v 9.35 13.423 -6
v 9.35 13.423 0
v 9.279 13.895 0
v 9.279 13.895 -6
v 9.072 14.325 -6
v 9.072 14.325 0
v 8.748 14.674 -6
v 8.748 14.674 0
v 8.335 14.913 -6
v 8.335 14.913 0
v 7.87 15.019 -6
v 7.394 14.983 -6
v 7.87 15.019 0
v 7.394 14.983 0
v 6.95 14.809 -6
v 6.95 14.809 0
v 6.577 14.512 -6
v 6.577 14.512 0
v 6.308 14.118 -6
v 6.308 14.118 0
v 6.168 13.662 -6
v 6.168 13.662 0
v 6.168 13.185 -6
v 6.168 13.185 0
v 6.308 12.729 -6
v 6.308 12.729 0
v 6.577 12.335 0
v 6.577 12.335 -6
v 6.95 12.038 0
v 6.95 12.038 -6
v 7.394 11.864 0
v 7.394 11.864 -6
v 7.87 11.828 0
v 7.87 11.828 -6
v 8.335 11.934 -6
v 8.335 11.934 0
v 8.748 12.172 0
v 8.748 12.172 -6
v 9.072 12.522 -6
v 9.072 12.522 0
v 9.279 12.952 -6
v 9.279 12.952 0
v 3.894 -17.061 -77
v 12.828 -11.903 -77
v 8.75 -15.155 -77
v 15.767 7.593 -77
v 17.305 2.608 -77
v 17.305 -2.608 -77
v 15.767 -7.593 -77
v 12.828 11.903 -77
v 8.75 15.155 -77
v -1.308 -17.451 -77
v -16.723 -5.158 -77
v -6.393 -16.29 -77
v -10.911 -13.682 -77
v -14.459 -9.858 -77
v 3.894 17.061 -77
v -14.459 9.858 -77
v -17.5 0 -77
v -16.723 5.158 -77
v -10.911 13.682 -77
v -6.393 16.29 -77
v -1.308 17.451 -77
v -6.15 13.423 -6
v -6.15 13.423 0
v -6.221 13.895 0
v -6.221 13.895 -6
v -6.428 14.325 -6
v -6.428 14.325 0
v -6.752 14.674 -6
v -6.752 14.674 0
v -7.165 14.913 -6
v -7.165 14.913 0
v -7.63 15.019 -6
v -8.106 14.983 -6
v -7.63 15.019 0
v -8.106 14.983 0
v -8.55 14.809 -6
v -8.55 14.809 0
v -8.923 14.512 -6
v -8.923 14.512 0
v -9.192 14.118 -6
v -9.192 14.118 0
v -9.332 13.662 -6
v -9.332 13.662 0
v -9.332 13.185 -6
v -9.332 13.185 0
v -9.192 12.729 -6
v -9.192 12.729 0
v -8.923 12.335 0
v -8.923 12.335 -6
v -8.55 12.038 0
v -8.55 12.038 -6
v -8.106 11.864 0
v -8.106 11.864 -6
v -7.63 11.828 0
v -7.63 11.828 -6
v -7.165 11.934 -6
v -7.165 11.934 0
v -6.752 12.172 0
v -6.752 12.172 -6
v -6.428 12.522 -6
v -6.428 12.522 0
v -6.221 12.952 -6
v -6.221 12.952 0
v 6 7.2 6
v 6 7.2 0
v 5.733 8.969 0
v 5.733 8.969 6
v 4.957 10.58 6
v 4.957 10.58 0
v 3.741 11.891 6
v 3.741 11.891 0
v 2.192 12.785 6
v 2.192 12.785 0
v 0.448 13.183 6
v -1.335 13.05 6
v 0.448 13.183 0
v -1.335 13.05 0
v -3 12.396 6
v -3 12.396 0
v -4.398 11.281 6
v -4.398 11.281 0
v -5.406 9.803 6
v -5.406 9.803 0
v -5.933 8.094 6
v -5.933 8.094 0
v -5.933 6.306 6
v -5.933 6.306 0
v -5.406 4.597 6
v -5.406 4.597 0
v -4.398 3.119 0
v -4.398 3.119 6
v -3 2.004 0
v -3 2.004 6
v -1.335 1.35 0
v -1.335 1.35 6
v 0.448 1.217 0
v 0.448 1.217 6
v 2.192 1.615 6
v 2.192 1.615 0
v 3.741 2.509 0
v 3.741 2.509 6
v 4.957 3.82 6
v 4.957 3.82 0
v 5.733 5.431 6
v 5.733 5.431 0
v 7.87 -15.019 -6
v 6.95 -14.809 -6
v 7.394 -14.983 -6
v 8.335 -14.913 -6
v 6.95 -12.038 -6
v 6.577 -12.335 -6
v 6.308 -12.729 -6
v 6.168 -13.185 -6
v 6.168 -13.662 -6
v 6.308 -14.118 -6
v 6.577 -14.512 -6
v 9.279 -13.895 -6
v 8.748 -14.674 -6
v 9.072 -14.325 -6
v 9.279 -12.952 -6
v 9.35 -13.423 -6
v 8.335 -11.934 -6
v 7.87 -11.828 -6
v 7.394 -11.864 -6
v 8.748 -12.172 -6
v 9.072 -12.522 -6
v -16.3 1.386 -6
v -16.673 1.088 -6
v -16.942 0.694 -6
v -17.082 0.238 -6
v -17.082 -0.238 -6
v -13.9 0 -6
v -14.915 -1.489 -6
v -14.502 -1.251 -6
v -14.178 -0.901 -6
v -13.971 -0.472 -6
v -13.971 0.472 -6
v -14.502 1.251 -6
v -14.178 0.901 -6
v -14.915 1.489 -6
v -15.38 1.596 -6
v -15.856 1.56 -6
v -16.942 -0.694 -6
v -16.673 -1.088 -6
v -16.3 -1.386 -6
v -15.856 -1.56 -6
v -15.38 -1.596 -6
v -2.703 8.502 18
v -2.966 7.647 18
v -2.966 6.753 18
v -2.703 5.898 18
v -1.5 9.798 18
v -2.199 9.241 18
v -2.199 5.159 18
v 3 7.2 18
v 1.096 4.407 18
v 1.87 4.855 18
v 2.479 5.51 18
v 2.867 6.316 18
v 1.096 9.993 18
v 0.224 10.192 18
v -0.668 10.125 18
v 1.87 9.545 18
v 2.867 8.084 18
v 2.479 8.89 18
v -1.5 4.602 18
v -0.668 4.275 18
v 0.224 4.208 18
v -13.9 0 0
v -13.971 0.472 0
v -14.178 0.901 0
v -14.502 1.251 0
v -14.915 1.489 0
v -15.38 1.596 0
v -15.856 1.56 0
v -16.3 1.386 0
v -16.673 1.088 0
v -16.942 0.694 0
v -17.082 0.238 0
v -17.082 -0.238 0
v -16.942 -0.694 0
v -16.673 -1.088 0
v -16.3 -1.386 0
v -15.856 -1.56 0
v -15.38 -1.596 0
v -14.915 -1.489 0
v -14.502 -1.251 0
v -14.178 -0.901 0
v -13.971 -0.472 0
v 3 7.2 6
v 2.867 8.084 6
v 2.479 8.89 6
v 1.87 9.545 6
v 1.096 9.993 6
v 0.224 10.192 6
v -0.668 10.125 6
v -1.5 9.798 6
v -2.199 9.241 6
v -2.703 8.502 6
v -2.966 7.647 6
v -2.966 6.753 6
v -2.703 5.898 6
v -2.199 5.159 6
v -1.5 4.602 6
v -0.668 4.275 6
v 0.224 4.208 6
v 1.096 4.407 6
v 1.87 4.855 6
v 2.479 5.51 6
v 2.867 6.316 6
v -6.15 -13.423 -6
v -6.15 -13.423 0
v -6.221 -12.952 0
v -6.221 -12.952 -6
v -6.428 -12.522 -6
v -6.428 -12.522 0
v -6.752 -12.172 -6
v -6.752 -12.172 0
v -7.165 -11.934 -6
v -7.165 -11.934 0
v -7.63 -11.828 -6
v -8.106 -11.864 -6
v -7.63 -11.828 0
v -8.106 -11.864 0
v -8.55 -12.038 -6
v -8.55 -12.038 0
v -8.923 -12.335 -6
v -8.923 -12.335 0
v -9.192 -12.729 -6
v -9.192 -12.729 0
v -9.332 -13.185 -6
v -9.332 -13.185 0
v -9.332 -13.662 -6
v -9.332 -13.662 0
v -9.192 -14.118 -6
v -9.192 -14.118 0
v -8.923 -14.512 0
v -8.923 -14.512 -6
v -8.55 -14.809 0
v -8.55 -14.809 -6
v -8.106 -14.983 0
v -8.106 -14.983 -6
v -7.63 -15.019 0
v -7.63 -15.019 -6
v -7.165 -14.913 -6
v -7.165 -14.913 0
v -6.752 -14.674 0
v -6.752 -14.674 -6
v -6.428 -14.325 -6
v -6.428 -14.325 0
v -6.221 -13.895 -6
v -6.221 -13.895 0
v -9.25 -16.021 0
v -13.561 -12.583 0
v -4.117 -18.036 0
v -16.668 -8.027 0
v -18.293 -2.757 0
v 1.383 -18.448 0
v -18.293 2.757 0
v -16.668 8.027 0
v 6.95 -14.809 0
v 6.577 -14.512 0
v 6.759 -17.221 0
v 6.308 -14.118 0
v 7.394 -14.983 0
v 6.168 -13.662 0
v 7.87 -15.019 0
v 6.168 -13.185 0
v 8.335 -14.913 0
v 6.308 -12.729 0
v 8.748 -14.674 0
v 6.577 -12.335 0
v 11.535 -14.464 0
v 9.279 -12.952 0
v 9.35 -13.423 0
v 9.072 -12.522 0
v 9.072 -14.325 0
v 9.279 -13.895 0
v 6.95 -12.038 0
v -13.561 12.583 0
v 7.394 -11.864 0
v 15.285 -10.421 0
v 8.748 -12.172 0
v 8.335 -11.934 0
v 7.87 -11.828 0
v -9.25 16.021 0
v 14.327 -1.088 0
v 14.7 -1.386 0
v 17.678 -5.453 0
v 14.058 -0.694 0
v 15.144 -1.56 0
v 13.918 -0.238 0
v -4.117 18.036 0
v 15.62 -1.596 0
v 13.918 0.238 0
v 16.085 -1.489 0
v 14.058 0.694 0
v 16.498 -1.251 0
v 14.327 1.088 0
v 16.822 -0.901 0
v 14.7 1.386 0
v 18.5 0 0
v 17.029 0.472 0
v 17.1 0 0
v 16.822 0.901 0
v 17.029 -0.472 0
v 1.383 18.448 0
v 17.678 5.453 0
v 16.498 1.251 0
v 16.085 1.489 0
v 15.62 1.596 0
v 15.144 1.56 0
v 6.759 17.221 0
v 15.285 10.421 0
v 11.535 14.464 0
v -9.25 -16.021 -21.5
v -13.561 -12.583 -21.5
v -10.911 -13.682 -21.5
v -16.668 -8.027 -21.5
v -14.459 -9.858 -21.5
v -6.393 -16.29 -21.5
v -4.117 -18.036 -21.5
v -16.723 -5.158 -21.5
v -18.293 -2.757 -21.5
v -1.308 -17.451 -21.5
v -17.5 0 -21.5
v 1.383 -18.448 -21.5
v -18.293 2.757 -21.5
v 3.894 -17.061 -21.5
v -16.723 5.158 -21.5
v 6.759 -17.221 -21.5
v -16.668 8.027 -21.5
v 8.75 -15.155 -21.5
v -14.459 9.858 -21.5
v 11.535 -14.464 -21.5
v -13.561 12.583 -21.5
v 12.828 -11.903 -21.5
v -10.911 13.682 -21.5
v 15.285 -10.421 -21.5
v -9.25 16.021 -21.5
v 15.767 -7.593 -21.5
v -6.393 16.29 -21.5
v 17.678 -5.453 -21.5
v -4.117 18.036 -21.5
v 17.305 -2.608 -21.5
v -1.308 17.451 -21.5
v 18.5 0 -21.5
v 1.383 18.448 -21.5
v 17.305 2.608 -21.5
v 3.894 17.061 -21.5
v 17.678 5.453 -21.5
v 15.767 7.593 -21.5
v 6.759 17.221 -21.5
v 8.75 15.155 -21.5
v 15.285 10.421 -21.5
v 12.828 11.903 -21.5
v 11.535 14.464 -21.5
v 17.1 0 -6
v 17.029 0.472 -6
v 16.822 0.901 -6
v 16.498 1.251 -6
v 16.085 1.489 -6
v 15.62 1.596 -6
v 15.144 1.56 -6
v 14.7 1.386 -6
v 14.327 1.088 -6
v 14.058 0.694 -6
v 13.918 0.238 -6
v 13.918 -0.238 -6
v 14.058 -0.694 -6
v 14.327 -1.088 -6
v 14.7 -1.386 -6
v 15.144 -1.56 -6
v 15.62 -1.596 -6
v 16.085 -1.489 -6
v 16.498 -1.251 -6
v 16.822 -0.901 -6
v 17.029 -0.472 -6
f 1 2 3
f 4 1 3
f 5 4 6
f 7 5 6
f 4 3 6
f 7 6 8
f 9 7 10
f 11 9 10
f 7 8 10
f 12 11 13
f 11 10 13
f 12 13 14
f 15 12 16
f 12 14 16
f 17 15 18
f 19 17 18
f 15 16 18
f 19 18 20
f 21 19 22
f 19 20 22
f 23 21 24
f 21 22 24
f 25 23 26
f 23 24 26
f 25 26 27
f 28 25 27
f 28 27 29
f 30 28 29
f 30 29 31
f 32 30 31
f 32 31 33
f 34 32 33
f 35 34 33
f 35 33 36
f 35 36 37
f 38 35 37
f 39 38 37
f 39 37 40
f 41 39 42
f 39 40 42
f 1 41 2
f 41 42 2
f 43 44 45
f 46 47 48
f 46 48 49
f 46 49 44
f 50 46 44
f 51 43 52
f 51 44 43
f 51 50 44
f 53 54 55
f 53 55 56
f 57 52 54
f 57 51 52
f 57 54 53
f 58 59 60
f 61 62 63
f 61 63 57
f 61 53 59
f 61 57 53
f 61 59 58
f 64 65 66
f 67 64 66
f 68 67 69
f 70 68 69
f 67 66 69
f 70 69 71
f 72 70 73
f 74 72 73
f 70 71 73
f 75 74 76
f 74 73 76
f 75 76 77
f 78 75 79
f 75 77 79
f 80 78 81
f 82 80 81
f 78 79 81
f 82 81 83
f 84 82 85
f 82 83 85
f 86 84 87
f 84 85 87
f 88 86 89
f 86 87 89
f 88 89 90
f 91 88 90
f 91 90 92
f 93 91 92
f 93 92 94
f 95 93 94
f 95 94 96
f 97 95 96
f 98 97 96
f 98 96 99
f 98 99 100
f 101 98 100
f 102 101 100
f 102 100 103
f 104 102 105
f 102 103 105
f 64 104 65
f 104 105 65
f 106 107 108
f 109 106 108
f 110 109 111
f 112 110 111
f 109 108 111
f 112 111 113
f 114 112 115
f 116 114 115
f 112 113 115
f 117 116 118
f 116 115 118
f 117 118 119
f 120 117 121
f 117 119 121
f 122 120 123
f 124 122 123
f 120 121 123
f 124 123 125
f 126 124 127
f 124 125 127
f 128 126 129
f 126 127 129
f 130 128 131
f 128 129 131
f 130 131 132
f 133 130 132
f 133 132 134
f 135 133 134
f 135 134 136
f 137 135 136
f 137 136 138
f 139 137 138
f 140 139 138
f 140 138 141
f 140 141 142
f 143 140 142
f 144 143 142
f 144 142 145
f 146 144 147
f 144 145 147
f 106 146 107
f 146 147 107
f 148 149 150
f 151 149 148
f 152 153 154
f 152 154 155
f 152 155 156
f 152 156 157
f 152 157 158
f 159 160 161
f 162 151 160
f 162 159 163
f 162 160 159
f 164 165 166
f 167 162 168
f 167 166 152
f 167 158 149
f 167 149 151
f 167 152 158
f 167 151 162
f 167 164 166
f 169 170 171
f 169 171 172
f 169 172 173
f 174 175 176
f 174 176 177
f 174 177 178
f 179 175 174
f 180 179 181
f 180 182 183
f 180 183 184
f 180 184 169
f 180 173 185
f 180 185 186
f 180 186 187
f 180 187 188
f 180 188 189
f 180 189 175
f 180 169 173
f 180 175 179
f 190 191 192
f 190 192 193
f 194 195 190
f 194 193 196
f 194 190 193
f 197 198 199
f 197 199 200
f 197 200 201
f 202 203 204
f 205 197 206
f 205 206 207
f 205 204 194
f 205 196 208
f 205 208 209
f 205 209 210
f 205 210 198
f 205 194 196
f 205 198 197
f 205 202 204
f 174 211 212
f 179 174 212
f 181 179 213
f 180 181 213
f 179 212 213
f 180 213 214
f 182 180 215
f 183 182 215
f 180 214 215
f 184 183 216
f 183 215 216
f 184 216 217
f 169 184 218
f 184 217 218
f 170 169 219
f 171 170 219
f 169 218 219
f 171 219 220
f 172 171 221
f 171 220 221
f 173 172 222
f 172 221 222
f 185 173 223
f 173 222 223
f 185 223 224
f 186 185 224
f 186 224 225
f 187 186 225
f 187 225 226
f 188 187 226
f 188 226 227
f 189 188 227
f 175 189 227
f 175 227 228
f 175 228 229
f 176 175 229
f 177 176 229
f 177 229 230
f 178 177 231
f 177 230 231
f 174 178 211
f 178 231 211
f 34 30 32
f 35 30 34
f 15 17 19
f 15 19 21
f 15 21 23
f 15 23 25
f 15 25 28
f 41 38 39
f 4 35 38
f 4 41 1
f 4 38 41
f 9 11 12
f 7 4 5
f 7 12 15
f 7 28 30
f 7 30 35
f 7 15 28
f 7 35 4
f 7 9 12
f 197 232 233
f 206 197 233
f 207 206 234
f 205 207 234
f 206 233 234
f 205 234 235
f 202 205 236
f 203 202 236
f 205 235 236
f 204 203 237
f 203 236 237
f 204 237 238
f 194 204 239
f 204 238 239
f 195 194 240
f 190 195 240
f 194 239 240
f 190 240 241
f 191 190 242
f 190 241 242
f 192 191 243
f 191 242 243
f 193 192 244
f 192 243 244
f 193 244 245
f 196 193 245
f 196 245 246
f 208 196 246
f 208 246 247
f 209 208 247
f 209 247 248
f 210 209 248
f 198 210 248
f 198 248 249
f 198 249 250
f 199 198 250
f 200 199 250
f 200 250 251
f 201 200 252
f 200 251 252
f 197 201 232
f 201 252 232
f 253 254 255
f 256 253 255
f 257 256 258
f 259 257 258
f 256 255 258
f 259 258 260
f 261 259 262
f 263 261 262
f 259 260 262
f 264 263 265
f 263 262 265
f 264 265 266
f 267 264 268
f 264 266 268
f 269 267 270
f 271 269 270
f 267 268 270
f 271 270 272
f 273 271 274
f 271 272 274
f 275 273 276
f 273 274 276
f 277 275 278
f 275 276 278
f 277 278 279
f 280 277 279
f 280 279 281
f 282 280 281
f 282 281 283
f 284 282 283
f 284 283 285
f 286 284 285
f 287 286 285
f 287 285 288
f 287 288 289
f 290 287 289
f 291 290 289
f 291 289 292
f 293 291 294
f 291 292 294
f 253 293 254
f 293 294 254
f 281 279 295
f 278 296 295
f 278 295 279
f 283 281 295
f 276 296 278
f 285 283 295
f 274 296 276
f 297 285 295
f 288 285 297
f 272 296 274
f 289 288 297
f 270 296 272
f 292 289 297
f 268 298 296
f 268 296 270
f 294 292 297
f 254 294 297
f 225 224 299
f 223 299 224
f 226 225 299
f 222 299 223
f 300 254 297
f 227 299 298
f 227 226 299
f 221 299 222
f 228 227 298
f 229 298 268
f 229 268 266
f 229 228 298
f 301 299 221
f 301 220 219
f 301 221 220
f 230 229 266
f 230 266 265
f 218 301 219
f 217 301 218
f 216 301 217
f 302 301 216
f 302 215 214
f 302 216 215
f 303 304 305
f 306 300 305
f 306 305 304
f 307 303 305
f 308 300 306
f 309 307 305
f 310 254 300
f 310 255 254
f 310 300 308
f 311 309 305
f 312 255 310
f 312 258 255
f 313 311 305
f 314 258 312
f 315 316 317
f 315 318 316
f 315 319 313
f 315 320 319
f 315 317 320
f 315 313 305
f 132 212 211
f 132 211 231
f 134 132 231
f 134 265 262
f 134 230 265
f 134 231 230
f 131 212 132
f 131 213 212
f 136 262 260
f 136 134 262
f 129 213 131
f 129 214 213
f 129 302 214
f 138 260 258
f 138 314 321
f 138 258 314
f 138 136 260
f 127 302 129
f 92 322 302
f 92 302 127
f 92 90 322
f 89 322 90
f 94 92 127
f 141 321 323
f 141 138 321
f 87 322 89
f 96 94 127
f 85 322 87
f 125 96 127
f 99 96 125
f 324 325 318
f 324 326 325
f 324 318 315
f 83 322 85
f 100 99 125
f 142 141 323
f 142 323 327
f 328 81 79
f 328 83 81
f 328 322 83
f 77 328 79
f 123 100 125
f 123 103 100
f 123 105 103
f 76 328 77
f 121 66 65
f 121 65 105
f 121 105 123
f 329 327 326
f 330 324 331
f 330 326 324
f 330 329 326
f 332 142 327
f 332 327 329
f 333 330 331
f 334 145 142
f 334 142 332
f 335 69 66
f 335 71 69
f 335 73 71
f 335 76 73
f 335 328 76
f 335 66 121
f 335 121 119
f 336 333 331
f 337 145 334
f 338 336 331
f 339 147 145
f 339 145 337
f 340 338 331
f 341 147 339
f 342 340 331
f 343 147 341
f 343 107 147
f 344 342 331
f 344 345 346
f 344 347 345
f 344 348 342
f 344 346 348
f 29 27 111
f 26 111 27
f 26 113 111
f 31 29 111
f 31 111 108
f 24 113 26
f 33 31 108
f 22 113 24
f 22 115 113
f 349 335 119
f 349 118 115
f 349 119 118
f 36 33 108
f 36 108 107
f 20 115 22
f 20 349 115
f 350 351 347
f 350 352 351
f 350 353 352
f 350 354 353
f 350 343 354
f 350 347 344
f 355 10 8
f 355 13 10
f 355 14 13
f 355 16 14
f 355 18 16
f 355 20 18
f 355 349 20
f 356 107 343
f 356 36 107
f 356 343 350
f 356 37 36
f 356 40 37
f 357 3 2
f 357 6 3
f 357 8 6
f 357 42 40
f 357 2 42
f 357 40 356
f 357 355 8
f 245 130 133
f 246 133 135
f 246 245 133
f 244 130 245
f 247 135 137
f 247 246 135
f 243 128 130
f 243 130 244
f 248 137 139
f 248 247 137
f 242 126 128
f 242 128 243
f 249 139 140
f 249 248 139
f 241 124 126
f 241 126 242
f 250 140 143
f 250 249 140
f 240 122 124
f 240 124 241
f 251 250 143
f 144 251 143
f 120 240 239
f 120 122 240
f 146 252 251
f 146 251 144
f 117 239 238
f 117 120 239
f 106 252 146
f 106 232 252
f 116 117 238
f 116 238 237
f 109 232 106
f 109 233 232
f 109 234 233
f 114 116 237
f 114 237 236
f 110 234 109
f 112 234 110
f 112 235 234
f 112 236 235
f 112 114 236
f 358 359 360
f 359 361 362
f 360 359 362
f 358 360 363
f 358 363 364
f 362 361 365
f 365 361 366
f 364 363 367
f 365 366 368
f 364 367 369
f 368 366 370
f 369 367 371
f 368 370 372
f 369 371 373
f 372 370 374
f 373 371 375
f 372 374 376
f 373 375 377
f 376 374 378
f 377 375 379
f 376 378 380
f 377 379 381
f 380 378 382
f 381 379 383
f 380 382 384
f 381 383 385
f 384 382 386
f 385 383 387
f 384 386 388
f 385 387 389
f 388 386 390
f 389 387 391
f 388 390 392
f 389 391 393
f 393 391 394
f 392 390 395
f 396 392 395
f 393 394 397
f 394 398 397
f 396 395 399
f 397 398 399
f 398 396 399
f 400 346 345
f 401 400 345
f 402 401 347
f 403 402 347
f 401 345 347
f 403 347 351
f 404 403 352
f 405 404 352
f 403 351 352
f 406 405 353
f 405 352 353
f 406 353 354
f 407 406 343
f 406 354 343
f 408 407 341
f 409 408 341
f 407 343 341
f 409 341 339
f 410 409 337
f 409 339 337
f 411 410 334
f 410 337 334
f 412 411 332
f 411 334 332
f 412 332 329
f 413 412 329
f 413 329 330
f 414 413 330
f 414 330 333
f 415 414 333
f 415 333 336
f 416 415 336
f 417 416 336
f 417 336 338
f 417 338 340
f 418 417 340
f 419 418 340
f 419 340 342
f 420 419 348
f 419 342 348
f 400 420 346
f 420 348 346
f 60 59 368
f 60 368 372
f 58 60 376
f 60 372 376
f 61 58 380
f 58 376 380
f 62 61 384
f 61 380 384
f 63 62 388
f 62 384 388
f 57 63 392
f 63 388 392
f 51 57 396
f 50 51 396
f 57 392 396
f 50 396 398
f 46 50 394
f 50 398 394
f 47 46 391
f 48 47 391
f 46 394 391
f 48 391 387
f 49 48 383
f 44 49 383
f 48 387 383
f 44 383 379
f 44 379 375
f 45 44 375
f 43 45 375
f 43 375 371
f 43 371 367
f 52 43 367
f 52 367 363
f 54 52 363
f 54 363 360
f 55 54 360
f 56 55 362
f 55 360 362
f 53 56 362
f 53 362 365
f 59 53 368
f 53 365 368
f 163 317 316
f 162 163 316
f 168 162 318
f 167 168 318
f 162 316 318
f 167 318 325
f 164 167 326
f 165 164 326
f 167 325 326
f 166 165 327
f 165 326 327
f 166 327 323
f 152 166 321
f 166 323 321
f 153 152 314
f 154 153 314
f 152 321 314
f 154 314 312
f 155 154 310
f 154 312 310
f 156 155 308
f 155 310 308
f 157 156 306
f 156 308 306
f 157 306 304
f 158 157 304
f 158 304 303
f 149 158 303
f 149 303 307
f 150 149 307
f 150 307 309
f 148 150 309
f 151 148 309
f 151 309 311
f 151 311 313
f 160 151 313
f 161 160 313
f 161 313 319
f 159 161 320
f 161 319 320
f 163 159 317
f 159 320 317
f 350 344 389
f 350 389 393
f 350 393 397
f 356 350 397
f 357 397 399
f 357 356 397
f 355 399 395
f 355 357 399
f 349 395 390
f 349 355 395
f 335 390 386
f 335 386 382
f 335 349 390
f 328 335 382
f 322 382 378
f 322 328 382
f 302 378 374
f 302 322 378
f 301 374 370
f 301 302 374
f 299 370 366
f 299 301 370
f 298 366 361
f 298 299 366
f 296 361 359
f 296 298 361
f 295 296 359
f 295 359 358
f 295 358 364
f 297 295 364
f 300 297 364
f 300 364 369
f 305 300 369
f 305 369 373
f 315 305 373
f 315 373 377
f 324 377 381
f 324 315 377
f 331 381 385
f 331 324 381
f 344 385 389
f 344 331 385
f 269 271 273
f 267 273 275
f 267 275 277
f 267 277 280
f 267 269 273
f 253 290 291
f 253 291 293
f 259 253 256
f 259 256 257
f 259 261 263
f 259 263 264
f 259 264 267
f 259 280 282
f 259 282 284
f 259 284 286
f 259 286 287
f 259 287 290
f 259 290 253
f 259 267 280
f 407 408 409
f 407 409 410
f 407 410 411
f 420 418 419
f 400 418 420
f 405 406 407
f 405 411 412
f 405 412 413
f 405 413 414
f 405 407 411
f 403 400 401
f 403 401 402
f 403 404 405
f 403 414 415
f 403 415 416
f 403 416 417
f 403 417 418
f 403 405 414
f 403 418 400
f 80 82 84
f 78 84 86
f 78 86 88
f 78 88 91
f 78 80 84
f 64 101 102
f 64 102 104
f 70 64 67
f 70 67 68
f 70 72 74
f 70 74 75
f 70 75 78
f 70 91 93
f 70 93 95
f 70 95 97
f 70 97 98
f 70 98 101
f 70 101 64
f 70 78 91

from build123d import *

# Parameters (mm, degrees)
ESBO_O1_R                = 18.5
RESSALTO_EXTRUS_O1_DEPTH = 21.5
ESBO_O2_R                = 17.5
RESSALTO_EXTRUS_O2_DEPTH = 55.5
ESBO_O5_R                = 6
RESSALTO_EXTRUS_O6_DEPTH = 6
ESBO_O6_R                = 3
RESSALTO_EXTRUS_O7_DEPTH = 12
ESBO_O7_R                = 1.6
CORTE_EXTRUS_O1_DEPTH    = 6


with BuildPart() as part:
    # Esboço1 → Ressalto-extrusão1 (new body)
    with BuildSketch(Plane.XY):
        Circle(ESBO_O1_R)
    extrude(amount=-RESSALTO_EXTRUS_O1_DEPTH)

    # Esboço2 → Ressalto-extrusão2 (add)
    with BuildSketch(Plane(origin=(0, 0, -21.5), x_dir=(-1, 0, 0), z_dir=(0, 0, -1))):
        Circle(ESBO_O2_R)
    extrude(amount=RESSALTO_EXTRUS_O2_DEPTH)

    # Esboço5 → Ressalto-extrusão6 (add)
    with BuildSketch(Plane.XY):
        with Locations((0, 7.2)):
            Circle(ESBO_O5_R)
    extrude(amount=RESSALTO_EXTRUS_O6_DEPTH)

    # Esboço6 → Ressalto-extrusão7 (add)
    with BuildSketch(Plane.XY.offset(6)):
        with Locations((0, 7.2)):
            Circle(ESBO_O6_R)
    extrude(amount=RESSALTO_EXTRUS_O7_DEPTH)

    # Esboço7 → Corte-extrusão1 (cut)
    with BuildSketch(Plane.XY):
        with Locations((-7.75, 13.423393759)):
            Circle(ESBO_O7_R)
        with Locations((7.75, 13.423393759)):
            Circle(ESBO_O7_R)
        with Locations((15.5, 0)):
            Circle(ESBO_O7_R)
        with Locations((7.75, -13.423393759)):
            Circle(ESBO_O7_R)
        with Locations((-7.75, -13.423393759)):
            Circle(ESBO_O7_R)
        with Locations((-15.5, 0)):
            Circle(ESBO_O7_R)
    extrude(amount=-CORTE_EXTRUS_O1_DEPTH, mode=Mode.SUBTRACT)


solid = part.part
